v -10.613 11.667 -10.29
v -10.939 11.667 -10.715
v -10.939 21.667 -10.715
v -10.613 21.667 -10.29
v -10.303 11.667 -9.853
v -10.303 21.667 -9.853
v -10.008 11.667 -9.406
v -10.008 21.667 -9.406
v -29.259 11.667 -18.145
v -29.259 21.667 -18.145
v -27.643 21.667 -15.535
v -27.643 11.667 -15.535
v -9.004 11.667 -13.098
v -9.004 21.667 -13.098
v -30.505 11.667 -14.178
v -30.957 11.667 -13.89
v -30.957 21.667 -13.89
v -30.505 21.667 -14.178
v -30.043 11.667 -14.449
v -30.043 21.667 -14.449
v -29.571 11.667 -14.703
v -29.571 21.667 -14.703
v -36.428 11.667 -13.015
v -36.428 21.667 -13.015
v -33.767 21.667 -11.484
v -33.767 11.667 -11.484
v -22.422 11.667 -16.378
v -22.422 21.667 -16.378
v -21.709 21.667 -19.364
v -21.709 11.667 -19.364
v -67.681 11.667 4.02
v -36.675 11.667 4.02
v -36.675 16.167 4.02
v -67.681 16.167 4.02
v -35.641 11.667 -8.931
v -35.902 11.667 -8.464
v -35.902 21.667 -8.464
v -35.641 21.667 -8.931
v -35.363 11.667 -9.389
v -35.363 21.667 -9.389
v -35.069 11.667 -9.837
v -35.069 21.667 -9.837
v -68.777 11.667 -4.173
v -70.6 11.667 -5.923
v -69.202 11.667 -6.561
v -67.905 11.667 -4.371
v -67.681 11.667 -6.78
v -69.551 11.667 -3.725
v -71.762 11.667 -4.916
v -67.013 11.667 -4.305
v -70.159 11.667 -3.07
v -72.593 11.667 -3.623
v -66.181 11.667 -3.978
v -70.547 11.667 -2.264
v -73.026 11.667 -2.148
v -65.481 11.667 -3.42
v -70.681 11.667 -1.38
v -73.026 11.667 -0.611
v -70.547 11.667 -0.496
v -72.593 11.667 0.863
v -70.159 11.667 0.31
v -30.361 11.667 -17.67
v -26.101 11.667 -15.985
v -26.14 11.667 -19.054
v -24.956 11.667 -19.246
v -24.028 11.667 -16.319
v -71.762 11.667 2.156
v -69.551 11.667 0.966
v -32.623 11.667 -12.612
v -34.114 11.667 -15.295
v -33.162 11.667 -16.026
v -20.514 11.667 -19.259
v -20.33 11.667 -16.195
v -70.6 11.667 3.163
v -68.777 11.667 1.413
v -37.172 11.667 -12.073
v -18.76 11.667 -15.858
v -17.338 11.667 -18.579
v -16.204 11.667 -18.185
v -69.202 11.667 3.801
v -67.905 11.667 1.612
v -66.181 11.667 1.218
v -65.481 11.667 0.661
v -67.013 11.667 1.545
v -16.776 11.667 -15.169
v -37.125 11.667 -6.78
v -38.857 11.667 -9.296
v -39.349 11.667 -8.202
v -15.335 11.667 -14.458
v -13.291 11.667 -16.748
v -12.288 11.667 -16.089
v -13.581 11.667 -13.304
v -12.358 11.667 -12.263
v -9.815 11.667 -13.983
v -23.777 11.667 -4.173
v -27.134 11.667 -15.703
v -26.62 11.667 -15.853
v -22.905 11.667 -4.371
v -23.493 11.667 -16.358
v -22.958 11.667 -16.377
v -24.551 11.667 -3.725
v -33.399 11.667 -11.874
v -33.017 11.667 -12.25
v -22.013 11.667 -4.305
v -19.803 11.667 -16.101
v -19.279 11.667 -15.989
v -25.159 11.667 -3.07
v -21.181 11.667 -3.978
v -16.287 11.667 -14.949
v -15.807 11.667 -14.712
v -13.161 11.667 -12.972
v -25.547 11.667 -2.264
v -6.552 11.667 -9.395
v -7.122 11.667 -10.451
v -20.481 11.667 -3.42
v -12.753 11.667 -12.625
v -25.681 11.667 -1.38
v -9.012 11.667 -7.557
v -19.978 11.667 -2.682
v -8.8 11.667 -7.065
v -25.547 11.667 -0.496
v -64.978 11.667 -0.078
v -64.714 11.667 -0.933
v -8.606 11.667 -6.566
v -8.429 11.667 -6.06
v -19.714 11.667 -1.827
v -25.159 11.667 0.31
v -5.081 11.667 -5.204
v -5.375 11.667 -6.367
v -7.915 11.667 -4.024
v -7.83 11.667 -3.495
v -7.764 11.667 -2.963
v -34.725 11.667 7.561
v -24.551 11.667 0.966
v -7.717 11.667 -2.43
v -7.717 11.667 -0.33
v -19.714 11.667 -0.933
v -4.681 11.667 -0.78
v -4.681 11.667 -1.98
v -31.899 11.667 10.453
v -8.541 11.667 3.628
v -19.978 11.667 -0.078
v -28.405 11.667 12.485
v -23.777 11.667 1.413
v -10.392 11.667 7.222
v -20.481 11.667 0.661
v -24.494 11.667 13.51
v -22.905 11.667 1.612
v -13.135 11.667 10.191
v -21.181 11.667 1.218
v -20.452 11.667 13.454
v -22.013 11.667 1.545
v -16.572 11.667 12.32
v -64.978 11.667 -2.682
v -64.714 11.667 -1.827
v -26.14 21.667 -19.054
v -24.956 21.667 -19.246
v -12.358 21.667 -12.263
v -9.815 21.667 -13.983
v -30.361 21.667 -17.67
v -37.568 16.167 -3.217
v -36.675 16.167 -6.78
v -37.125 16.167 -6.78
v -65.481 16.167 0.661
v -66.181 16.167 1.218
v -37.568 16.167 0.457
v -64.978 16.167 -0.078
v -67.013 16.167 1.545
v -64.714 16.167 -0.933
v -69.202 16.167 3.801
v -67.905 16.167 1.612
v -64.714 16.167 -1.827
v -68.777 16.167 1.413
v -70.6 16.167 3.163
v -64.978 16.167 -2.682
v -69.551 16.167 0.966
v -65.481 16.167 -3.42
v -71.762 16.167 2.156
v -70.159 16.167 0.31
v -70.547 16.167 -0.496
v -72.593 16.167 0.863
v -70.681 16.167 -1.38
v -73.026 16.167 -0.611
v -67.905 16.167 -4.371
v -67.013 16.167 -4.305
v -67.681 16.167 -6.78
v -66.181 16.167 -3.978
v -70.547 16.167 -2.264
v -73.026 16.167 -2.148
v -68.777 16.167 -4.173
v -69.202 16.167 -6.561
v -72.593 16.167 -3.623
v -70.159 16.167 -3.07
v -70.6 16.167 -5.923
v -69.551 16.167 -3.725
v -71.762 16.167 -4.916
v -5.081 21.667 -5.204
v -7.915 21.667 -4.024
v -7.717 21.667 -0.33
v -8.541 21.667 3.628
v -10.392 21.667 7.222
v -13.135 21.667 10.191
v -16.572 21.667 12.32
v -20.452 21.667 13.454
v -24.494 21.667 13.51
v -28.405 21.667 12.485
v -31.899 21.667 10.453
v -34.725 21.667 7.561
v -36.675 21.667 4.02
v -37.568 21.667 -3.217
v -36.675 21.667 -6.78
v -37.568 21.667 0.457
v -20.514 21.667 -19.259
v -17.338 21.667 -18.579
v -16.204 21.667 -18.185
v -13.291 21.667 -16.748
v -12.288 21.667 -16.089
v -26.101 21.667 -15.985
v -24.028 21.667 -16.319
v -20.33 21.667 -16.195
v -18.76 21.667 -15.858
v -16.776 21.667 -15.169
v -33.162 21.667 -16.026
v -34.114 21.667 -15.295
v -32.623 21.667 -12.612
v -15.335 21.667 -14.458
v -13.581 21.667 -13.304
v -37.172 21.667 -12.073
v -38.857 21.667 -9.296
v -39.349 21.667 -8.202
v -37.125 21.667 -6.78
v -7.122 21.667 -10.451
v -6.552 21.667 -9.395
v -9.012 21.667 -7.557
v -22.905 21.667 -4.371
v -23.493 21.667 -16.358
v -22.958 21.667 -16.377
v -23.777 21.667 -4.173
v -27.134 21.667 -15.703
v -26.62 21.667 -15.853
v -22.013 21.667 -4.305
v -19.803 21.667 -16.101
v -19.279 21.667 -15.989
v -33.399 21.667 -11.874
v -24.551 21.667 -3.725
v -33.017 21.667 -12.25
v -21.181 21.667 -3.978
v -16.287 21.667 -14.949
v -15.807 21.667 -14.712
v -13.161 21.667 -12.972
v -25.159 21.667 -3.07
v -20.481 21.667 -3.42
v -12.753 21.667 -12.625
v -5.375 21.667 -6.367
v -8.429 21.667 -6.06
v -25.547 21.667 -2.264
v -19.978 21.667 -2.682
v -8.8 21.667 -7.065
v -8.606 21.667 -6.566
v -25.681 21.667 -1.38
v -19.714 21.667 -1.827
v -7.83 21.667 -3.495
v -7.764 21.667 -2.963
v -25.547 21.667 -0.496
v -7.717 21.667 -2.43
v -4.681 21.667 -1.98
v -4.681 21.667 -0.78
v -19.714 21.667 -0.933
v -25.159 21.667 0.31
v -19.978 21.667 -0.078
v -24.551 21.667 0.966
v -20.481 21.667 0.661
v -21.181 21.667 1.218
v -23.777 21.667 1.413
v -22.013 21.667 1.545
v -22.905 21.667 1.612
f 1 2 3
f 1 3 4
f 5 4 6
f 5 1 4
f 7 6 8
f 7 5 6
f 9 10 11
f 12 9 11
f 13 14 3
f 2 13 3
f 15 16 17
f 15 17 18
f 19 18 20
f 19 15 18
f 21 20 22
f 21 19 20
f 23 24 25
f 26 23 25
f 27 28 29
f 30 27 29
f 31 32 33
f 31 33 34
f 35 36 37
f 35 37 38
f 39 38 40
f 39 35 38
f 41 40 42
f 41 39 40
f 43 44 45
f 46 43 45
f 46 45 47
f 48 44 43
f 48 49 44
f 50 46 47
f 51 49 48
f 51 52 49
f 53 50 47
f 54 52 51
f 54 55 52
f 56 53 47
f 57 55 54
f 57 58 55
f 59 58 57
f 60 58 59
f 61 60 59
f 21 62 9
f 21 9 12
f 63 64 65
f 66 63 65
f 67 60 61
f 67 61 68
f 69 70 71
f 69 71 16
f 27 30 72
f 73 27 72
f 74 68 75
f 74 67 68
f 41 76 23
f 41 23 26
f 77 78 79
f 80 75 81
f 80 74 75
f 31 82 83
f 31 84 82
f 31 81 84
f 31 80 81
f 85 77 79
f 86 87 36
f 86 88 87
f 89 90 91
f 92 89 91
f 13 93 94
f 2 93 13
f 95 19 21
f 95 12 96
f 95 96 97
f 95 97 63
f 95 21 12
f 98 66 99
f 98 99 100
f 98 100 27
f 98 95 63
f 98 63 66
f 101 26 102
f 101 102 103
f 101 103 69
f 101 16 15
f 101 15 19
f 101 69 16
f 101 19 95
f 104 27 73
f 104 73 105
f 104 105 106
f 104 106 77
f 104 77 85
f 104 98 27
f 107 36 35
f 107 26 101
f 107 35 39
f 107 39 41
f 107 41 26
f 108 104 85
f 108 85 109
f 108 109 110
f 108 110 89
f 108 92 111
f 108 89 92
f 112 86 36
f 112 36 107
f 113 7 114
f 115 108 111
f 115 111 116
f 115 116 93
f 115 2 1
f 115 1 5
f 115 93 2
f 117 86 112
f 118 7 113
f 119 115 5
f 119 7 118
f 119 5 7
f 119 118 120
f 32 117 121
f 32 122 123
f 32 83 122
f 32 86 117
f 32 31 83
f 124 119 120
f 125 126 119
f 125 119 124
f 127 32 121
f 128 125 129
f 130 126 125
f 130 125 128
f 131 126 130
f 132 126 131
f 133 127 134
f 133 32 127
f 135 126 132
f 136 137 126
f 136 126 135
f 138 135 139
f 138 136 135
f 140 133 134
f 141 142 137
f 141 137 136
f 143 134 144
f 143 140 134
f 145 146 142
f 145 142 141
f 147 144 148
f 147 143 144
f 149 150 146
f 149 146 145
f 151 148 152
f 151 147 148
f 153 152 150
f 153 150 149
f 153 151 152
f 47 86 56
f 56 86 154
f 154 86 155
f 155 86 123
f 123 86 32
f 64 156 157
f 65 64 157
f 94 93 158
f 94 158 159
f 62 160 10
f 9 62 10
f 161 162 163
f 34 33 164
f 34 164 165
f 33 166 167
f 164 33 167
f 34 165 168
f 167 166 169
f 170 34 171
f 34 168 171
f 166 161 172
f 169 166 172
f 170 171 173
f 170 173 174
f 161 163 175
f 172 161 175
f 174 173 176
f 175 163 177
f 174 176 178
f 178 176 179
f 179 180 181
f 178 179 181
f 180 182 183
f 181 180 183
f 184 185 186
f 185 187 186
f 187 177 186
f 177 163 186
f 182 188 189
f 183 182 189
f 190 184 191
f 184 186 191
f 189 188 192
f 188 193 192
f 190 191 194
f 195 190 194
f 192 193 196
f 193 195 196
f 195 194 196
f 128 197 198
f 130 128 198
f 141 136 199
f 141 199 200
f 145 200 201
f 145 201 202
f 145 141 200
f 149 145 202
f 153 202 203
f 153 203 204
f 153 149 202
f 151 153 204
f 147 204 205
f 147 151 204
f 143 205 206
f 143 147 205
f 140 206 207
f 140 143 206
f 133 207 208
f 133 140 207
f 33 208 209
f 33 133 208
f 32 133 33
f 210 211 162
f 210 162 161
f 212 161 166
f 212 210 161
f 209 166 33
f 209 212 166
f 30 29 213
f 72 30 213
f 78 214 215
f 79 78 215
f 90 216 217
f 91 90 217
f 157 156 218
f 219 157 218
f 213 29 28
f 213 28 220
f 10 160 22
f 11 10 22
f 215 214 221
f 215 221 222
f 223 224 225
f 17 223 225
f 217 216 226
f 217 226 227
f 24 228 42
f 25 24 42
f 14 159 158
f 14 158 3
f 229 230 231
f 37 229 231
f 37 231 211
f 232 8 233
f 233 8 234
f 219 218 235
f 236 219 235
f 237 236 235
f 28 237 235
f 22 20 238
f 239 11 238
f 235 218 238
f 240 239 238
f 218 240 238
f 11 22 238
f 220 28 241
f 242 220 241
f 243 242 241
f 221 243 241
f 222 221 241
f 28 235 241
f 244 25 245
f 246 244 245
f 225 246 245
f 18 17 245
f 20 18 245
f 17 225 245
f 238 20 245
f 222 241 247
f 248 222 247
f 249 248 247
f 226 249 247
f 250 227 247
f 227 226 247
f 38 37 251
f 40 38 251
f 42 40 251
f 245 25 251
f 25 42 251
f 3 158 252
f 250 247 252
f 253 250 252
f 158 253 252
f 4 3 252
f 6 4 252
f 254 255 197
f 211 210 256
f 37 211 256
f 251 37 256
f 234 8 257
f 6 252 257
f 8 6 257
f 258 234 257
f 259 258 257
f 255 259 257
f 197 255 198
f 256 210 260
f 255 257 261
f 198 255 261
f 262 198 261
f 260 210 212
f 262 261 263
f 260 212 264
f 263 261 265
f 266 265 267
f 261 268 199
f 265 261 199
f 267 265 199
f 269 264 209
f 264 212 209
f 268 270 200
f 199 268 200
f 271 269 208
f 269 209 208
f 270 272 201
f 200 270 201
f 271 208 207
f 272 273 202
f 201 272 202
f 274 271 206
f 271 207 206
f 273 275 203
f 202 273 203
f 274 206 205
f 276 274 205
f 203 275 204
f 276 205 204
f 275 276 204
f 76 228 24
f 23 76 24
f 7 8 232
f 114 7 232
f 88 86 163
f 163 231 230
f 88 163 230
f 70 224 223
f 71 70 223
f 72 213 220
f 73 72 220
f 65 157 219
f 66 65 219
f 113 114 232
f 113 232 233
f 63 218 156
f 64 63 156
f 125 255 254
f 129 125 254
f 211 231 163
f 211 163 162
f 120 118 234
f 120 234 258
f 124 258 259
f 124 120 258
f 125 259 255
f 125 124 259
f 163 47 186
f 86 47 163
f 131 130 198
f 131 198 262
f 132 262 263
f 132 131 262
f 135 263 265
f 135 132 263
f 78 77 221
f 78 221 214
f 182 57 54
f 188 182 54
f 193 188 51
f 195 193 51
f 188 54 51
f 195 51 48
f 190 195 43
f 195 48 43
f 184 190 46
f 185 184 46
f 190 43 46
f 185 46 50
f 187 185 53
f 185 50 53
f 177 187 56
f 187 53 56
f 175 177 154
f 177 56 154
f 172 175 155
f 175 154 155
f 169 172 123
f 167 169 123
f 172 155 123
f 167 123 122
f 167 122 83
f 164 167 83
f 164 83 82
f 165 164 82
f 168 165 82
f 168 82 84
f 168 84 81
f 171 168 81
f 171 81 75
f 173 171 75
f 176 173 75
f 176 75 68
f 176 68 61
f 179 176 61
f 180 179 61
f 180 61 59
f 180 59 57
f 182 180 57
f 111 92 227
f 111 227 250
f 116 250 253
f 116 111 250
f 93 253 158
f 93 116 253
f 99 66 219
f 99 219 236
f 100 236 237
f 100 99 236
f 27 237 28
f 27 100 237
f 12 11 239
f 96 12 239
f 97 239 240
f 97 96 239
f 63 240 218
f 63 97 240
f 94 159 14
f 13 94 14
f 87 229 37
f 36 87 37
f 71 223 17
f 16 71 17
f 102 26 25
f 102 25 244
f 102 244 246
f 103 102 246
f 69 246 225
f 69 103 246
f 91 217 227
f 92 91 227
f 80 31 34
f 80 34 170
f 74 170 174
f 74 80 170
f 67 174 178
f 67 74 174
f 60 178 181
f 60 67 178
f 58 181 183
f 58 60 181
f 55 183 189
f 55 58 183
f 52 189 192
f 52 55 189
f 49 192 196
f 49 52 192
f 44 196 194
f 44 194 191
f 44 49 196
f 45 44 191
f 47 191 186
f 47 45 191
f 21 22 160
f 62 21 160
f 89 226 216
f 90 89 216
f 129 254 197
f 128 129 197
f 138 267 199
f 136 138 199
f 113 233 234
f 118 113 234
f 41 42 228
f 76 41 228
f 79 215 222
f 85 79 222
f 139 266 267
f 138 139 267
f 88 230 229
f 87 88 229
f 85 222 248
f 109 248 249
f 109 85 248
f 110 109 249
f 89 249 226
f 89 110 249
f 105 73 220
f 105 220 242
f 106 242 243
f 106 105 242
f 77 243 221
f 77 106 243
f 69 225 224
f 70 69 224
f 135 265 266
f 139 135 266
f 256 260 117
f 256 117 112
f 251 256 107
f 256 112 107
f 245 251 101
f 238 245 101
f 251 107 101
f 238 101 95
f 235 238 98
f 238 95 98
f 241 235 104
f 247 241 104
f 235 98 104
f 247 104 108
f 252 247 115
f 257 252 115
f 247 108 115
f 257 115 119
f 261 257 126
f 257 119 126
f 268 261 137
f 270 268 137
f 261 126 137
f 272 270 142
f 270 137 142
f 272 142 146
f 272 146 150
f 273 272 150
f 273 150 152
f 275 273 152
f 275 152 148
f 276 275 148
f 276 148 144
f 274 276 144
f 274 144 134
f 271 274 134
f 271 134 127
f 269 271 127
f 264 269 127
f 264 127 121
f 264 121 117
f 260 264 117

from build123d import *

# Parameters (mm, degrees)
BOSS_EXTRUDE1_DEPTH = 33.333333333
BOSS_EXTRUDE2_DEPTH = 33.333333333
CIRPATTERN2_COUNT   = 13
CIRPATTERN2_ANGLE   = 170
F_20_0MM_1_D        = 20
SCALE_1_SCALE       = 0.3
CUT_EXTRUDE_1_DEPTH = 5.5


with BuildPart() as part:
    # Sketch1 → Boss-Extrude1 (new body)
    with BuildSketch(Plane(origin=(0, 0, 0), x_dir=(1, 0, 0), z_dir=(0, 1, 0))):
        with BuildLine():
            Line((-150, 18), (-46.647615159, 18))
            ThreePointArc((-46.647615159, 18), (50, 0), (-46.647615159, -18))
            Line((-46.647615159, -18), (-150, -18))
            ThreePointArc((-150, -18), (-168, 0), (-150, 18))
        make_face()
    extrude(amount=BOSS_EXTRUDE1_DEPTH)

    # Sketch2 → Boss-Extrude2 (add)
    with BuildSketch(Plane(origin=(0, 33.333333333, 0), x_dir=(1, 0, 0), z_dir=(0, 1, 0))):
        Polygon((49.877349569, 3.5), (60, 2), (60, -2), (49.877349569, -3.5), (50, 0), align=None)
    boss_extrude2 = extrude(amount=-BOSS_EXTRUDE2_DEPTH)

    # CirPattern2: Boss-Extrude2 ×13 about axis
    cirpattern2_axis = Axis((0, 0, 0), (0, 1, 0))
    for i in range(1, CIRPATTERN2_COUNT):
        add(boss_extrude2.rotate(cirpattern2_axis, i * CIRPATTERN2_ANGLE / (CIRPATTERN2_COUNT - 1)))

    # Ø20.0mm 맞춤핀 구멍1 (through all)
    with Locations(Plane(origin=(0, 33.333333333, 0), x_dir=(1, 0, 0), z_dir=(0, 1, 0))):
        with Locations((-150, 0), (0, 0)):
            Hole(F_20_0MM_1_D / 2)


with BuildPart() as part_1:
    # 축척1: scaled about (-32.400752932, 16.666666667, -1.971262661)
    add(part.part.scale(SCALE_1_SCALE).moved(Location((-22.680527052, 11.666666667, -1.379883863))))

    # 스케치1 → 컷-돌출1 (cut)
    with BuildSketch(Plane(origin=(0, 21.666666667, 0), x_dir=(1, 0, 0), z_dir=(0, 1, 0))):
        with BuildLine():
            Line((-36.6748116, -4.020116137), (-67.680527053, -4.020116137))
            ThreePointArc((-67.680527053, -4.020116137), (-73.080527053, 1.379883863), (-67.680527053, 6.779883863))
            Line((-67.680527053, 6.779883863), (-36.6748116, 6.779883863))
            ThreePointArc((-36.6748116, 6.779883863), (-37.680527053, 1.379883863), (-36.6748116, -4.020116137))
        make_face()
    extrude(amount=-CUT_EXTRUDE_1_DEPTH, mode=Mode.SUBTRACT)


solid = part_1.part
